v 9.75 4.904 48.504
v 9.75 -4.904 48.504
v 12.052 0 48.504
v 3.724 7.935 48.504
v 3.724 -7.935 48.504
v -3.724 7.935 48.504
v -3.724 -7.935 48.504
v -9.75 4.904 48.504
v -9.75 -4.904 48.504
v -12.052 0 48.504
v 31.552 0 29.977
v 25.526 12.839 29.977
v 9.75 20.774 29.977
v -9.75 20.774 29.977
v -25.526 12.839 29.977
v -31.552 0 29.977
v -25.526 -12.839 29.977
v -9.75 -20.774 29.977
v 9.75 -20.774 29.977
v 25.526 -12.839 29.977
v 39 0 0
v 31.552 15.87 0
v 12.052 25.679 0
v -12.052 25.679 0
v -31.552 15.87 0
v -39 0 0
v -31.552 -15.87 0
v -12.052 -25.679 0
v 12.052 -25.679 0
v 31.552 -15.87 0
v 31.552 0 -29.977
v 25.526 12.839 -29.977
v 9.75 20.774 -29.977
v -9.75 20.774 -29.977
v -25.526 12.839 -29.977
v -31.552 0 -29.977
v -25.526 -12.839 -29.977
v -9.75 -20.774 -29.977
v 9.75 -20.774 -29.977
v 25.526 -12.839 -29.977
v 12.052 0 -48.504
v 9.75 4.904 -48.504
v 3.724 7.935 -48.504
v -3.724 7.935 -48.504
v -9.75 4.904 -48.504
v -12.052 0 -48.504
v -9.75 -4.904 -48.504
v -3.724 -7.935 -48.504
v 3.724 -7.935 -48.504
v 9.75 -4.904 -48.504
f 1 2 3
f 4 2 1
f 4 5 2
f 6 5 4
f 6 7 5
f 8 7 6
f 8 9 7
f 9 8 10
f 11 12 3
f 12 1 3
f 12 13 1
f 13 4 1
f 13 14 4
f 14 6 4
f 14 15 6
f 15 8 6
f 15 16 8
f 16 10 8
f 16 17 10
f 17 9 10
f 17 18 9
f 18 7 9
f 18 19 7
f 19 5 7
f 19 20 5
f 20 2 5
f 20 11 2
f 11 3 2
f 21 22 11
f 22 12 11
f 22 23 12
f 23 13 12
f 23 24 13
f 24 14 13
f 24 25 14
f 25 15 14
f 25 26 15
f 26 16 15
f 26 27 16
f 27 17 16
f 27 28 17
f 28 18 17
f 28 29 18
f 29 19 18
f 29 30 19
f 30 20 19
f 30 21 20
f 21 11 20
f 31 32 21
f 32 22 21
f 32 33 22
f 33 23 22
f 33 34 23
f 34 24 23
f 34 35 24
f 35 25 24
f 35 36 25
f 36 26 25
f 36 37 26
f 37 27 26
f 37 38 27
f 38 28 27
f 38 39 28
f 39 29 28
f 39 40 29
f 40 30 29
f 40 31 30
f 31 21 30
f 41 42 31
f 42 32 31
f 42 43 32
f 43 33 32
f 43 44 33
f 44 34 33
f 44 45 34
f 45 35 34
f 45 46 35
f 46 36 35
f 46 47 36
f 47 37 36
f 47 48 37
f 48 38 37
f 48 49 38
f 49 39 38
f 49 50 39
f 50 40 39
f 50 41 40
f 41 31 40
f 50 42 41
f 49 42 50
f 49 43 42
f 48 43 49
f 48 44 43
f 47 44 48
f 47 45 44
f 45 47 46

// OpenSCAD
// Generated by SolidPython 1.0.1 on 2020-07-29 00:46:50


scale(v = [13, 9, 17]) {
	sphere(r = 3);
}
/***********************************************
*********      SolidPython code:      **********
************************************************
 
# import packages: SolidPython
from solid import *
from solid.utils import *
from itertools import chain, combinations, permutations


class Resize:

    def __init__(self, scad_file):
        self.scad_file = scad_file
        #self.scad_file = import_scad(scad_file)
        # cone/cylinder param:
        self.r1 = 0
        self.r2 = 0
        self.h = 0
        # rectangular prism param:
        self.w = 0
        self.l = 0
        # ellipse param:
        self.r = 0

    # import OpenScad code (file name corresponds to shape)


    # classify shape + parameters
    def assign(self, param1, param2, param3):
        if self.scad_file == 'cone.scad':
            self.r1 = param1
            self.r2 = param2
            self.h = param3
        elif self.scad_file == 'cylinder.scad':
            self.r1 = param1
            self.r2 = param2
            self.h = param3
        elif self.scad_file == 'rectangularPrism.scad':
            self.h = param1
            self.l = param2
            self.w = param3
        else:
            self.r = param1
            self.h = param2

    # resize parameters
    def iterate(self):
        x = range(3, 20, 2)
        i = 1
        if self.scad_file == 'cone.scad':
            tempList = list(permutations(x, 2))
            for temp in tempList:
                param1 = temp[0]
                param2 = temp[1]
                filepath = 'produced_scad_files/' + 'cone' + str(param1) + '_' + str(param2) + '_' + '.scad'
                scad_render_to_file(cylinder(h=param1, r1=param2, r2=0), filepath)

        elif self.scad_file == 'cylinder.scad':
            tempList = list(permutations(x, 3))
            for temp in tempList:
                param1 = temp[0]
                param2 = temp[1]
                filepath = 'produced_scad_files/' + 'cylinder' + str(param1) + '_' + str(param2) + '_' + '.scad'
                scad_render_to_file(cylinder(h=param1, r1=param2, r2=param2), filepath)

        elif self.scad_file == 'rectangularPrism.scad':
            tempList = list(permutations(x, 3))
            for temp in tempList:
                param1 = temp[0]
                param2 = temp[1]
                param3 = temp[2]
                filepath = 'produced_scad_files/' + 'rectangularPrism' + str(param1) + '_' + str(param2) + '_' + str(
                    param3) + '.scad'
                scad_render_to_file(cube(size=(param1, param2, param3)), filepath)

        elif self.scad_file == 'ellipse.scad':
            tempList = list(permutations(x, 4))
            for temp in tempList:
                param1 = temp[0]
                param2 = temp[1]
                param3 = temp[2]
                param4 = temp[3]
                filepath = 'produced_scad_files/' + 'ellipse' + str(param1) + '_' + str(param2) + '_' + str(param3) + '_' + str(param4) + '.scad'
                scad_render_to_file(scale([param1, param2, param3])(sphere(r=param4)), filepath)

    def render_to_scadfile(self):
        scad_render_to_file(scad, 'example.scad') 
 
************************************************/
